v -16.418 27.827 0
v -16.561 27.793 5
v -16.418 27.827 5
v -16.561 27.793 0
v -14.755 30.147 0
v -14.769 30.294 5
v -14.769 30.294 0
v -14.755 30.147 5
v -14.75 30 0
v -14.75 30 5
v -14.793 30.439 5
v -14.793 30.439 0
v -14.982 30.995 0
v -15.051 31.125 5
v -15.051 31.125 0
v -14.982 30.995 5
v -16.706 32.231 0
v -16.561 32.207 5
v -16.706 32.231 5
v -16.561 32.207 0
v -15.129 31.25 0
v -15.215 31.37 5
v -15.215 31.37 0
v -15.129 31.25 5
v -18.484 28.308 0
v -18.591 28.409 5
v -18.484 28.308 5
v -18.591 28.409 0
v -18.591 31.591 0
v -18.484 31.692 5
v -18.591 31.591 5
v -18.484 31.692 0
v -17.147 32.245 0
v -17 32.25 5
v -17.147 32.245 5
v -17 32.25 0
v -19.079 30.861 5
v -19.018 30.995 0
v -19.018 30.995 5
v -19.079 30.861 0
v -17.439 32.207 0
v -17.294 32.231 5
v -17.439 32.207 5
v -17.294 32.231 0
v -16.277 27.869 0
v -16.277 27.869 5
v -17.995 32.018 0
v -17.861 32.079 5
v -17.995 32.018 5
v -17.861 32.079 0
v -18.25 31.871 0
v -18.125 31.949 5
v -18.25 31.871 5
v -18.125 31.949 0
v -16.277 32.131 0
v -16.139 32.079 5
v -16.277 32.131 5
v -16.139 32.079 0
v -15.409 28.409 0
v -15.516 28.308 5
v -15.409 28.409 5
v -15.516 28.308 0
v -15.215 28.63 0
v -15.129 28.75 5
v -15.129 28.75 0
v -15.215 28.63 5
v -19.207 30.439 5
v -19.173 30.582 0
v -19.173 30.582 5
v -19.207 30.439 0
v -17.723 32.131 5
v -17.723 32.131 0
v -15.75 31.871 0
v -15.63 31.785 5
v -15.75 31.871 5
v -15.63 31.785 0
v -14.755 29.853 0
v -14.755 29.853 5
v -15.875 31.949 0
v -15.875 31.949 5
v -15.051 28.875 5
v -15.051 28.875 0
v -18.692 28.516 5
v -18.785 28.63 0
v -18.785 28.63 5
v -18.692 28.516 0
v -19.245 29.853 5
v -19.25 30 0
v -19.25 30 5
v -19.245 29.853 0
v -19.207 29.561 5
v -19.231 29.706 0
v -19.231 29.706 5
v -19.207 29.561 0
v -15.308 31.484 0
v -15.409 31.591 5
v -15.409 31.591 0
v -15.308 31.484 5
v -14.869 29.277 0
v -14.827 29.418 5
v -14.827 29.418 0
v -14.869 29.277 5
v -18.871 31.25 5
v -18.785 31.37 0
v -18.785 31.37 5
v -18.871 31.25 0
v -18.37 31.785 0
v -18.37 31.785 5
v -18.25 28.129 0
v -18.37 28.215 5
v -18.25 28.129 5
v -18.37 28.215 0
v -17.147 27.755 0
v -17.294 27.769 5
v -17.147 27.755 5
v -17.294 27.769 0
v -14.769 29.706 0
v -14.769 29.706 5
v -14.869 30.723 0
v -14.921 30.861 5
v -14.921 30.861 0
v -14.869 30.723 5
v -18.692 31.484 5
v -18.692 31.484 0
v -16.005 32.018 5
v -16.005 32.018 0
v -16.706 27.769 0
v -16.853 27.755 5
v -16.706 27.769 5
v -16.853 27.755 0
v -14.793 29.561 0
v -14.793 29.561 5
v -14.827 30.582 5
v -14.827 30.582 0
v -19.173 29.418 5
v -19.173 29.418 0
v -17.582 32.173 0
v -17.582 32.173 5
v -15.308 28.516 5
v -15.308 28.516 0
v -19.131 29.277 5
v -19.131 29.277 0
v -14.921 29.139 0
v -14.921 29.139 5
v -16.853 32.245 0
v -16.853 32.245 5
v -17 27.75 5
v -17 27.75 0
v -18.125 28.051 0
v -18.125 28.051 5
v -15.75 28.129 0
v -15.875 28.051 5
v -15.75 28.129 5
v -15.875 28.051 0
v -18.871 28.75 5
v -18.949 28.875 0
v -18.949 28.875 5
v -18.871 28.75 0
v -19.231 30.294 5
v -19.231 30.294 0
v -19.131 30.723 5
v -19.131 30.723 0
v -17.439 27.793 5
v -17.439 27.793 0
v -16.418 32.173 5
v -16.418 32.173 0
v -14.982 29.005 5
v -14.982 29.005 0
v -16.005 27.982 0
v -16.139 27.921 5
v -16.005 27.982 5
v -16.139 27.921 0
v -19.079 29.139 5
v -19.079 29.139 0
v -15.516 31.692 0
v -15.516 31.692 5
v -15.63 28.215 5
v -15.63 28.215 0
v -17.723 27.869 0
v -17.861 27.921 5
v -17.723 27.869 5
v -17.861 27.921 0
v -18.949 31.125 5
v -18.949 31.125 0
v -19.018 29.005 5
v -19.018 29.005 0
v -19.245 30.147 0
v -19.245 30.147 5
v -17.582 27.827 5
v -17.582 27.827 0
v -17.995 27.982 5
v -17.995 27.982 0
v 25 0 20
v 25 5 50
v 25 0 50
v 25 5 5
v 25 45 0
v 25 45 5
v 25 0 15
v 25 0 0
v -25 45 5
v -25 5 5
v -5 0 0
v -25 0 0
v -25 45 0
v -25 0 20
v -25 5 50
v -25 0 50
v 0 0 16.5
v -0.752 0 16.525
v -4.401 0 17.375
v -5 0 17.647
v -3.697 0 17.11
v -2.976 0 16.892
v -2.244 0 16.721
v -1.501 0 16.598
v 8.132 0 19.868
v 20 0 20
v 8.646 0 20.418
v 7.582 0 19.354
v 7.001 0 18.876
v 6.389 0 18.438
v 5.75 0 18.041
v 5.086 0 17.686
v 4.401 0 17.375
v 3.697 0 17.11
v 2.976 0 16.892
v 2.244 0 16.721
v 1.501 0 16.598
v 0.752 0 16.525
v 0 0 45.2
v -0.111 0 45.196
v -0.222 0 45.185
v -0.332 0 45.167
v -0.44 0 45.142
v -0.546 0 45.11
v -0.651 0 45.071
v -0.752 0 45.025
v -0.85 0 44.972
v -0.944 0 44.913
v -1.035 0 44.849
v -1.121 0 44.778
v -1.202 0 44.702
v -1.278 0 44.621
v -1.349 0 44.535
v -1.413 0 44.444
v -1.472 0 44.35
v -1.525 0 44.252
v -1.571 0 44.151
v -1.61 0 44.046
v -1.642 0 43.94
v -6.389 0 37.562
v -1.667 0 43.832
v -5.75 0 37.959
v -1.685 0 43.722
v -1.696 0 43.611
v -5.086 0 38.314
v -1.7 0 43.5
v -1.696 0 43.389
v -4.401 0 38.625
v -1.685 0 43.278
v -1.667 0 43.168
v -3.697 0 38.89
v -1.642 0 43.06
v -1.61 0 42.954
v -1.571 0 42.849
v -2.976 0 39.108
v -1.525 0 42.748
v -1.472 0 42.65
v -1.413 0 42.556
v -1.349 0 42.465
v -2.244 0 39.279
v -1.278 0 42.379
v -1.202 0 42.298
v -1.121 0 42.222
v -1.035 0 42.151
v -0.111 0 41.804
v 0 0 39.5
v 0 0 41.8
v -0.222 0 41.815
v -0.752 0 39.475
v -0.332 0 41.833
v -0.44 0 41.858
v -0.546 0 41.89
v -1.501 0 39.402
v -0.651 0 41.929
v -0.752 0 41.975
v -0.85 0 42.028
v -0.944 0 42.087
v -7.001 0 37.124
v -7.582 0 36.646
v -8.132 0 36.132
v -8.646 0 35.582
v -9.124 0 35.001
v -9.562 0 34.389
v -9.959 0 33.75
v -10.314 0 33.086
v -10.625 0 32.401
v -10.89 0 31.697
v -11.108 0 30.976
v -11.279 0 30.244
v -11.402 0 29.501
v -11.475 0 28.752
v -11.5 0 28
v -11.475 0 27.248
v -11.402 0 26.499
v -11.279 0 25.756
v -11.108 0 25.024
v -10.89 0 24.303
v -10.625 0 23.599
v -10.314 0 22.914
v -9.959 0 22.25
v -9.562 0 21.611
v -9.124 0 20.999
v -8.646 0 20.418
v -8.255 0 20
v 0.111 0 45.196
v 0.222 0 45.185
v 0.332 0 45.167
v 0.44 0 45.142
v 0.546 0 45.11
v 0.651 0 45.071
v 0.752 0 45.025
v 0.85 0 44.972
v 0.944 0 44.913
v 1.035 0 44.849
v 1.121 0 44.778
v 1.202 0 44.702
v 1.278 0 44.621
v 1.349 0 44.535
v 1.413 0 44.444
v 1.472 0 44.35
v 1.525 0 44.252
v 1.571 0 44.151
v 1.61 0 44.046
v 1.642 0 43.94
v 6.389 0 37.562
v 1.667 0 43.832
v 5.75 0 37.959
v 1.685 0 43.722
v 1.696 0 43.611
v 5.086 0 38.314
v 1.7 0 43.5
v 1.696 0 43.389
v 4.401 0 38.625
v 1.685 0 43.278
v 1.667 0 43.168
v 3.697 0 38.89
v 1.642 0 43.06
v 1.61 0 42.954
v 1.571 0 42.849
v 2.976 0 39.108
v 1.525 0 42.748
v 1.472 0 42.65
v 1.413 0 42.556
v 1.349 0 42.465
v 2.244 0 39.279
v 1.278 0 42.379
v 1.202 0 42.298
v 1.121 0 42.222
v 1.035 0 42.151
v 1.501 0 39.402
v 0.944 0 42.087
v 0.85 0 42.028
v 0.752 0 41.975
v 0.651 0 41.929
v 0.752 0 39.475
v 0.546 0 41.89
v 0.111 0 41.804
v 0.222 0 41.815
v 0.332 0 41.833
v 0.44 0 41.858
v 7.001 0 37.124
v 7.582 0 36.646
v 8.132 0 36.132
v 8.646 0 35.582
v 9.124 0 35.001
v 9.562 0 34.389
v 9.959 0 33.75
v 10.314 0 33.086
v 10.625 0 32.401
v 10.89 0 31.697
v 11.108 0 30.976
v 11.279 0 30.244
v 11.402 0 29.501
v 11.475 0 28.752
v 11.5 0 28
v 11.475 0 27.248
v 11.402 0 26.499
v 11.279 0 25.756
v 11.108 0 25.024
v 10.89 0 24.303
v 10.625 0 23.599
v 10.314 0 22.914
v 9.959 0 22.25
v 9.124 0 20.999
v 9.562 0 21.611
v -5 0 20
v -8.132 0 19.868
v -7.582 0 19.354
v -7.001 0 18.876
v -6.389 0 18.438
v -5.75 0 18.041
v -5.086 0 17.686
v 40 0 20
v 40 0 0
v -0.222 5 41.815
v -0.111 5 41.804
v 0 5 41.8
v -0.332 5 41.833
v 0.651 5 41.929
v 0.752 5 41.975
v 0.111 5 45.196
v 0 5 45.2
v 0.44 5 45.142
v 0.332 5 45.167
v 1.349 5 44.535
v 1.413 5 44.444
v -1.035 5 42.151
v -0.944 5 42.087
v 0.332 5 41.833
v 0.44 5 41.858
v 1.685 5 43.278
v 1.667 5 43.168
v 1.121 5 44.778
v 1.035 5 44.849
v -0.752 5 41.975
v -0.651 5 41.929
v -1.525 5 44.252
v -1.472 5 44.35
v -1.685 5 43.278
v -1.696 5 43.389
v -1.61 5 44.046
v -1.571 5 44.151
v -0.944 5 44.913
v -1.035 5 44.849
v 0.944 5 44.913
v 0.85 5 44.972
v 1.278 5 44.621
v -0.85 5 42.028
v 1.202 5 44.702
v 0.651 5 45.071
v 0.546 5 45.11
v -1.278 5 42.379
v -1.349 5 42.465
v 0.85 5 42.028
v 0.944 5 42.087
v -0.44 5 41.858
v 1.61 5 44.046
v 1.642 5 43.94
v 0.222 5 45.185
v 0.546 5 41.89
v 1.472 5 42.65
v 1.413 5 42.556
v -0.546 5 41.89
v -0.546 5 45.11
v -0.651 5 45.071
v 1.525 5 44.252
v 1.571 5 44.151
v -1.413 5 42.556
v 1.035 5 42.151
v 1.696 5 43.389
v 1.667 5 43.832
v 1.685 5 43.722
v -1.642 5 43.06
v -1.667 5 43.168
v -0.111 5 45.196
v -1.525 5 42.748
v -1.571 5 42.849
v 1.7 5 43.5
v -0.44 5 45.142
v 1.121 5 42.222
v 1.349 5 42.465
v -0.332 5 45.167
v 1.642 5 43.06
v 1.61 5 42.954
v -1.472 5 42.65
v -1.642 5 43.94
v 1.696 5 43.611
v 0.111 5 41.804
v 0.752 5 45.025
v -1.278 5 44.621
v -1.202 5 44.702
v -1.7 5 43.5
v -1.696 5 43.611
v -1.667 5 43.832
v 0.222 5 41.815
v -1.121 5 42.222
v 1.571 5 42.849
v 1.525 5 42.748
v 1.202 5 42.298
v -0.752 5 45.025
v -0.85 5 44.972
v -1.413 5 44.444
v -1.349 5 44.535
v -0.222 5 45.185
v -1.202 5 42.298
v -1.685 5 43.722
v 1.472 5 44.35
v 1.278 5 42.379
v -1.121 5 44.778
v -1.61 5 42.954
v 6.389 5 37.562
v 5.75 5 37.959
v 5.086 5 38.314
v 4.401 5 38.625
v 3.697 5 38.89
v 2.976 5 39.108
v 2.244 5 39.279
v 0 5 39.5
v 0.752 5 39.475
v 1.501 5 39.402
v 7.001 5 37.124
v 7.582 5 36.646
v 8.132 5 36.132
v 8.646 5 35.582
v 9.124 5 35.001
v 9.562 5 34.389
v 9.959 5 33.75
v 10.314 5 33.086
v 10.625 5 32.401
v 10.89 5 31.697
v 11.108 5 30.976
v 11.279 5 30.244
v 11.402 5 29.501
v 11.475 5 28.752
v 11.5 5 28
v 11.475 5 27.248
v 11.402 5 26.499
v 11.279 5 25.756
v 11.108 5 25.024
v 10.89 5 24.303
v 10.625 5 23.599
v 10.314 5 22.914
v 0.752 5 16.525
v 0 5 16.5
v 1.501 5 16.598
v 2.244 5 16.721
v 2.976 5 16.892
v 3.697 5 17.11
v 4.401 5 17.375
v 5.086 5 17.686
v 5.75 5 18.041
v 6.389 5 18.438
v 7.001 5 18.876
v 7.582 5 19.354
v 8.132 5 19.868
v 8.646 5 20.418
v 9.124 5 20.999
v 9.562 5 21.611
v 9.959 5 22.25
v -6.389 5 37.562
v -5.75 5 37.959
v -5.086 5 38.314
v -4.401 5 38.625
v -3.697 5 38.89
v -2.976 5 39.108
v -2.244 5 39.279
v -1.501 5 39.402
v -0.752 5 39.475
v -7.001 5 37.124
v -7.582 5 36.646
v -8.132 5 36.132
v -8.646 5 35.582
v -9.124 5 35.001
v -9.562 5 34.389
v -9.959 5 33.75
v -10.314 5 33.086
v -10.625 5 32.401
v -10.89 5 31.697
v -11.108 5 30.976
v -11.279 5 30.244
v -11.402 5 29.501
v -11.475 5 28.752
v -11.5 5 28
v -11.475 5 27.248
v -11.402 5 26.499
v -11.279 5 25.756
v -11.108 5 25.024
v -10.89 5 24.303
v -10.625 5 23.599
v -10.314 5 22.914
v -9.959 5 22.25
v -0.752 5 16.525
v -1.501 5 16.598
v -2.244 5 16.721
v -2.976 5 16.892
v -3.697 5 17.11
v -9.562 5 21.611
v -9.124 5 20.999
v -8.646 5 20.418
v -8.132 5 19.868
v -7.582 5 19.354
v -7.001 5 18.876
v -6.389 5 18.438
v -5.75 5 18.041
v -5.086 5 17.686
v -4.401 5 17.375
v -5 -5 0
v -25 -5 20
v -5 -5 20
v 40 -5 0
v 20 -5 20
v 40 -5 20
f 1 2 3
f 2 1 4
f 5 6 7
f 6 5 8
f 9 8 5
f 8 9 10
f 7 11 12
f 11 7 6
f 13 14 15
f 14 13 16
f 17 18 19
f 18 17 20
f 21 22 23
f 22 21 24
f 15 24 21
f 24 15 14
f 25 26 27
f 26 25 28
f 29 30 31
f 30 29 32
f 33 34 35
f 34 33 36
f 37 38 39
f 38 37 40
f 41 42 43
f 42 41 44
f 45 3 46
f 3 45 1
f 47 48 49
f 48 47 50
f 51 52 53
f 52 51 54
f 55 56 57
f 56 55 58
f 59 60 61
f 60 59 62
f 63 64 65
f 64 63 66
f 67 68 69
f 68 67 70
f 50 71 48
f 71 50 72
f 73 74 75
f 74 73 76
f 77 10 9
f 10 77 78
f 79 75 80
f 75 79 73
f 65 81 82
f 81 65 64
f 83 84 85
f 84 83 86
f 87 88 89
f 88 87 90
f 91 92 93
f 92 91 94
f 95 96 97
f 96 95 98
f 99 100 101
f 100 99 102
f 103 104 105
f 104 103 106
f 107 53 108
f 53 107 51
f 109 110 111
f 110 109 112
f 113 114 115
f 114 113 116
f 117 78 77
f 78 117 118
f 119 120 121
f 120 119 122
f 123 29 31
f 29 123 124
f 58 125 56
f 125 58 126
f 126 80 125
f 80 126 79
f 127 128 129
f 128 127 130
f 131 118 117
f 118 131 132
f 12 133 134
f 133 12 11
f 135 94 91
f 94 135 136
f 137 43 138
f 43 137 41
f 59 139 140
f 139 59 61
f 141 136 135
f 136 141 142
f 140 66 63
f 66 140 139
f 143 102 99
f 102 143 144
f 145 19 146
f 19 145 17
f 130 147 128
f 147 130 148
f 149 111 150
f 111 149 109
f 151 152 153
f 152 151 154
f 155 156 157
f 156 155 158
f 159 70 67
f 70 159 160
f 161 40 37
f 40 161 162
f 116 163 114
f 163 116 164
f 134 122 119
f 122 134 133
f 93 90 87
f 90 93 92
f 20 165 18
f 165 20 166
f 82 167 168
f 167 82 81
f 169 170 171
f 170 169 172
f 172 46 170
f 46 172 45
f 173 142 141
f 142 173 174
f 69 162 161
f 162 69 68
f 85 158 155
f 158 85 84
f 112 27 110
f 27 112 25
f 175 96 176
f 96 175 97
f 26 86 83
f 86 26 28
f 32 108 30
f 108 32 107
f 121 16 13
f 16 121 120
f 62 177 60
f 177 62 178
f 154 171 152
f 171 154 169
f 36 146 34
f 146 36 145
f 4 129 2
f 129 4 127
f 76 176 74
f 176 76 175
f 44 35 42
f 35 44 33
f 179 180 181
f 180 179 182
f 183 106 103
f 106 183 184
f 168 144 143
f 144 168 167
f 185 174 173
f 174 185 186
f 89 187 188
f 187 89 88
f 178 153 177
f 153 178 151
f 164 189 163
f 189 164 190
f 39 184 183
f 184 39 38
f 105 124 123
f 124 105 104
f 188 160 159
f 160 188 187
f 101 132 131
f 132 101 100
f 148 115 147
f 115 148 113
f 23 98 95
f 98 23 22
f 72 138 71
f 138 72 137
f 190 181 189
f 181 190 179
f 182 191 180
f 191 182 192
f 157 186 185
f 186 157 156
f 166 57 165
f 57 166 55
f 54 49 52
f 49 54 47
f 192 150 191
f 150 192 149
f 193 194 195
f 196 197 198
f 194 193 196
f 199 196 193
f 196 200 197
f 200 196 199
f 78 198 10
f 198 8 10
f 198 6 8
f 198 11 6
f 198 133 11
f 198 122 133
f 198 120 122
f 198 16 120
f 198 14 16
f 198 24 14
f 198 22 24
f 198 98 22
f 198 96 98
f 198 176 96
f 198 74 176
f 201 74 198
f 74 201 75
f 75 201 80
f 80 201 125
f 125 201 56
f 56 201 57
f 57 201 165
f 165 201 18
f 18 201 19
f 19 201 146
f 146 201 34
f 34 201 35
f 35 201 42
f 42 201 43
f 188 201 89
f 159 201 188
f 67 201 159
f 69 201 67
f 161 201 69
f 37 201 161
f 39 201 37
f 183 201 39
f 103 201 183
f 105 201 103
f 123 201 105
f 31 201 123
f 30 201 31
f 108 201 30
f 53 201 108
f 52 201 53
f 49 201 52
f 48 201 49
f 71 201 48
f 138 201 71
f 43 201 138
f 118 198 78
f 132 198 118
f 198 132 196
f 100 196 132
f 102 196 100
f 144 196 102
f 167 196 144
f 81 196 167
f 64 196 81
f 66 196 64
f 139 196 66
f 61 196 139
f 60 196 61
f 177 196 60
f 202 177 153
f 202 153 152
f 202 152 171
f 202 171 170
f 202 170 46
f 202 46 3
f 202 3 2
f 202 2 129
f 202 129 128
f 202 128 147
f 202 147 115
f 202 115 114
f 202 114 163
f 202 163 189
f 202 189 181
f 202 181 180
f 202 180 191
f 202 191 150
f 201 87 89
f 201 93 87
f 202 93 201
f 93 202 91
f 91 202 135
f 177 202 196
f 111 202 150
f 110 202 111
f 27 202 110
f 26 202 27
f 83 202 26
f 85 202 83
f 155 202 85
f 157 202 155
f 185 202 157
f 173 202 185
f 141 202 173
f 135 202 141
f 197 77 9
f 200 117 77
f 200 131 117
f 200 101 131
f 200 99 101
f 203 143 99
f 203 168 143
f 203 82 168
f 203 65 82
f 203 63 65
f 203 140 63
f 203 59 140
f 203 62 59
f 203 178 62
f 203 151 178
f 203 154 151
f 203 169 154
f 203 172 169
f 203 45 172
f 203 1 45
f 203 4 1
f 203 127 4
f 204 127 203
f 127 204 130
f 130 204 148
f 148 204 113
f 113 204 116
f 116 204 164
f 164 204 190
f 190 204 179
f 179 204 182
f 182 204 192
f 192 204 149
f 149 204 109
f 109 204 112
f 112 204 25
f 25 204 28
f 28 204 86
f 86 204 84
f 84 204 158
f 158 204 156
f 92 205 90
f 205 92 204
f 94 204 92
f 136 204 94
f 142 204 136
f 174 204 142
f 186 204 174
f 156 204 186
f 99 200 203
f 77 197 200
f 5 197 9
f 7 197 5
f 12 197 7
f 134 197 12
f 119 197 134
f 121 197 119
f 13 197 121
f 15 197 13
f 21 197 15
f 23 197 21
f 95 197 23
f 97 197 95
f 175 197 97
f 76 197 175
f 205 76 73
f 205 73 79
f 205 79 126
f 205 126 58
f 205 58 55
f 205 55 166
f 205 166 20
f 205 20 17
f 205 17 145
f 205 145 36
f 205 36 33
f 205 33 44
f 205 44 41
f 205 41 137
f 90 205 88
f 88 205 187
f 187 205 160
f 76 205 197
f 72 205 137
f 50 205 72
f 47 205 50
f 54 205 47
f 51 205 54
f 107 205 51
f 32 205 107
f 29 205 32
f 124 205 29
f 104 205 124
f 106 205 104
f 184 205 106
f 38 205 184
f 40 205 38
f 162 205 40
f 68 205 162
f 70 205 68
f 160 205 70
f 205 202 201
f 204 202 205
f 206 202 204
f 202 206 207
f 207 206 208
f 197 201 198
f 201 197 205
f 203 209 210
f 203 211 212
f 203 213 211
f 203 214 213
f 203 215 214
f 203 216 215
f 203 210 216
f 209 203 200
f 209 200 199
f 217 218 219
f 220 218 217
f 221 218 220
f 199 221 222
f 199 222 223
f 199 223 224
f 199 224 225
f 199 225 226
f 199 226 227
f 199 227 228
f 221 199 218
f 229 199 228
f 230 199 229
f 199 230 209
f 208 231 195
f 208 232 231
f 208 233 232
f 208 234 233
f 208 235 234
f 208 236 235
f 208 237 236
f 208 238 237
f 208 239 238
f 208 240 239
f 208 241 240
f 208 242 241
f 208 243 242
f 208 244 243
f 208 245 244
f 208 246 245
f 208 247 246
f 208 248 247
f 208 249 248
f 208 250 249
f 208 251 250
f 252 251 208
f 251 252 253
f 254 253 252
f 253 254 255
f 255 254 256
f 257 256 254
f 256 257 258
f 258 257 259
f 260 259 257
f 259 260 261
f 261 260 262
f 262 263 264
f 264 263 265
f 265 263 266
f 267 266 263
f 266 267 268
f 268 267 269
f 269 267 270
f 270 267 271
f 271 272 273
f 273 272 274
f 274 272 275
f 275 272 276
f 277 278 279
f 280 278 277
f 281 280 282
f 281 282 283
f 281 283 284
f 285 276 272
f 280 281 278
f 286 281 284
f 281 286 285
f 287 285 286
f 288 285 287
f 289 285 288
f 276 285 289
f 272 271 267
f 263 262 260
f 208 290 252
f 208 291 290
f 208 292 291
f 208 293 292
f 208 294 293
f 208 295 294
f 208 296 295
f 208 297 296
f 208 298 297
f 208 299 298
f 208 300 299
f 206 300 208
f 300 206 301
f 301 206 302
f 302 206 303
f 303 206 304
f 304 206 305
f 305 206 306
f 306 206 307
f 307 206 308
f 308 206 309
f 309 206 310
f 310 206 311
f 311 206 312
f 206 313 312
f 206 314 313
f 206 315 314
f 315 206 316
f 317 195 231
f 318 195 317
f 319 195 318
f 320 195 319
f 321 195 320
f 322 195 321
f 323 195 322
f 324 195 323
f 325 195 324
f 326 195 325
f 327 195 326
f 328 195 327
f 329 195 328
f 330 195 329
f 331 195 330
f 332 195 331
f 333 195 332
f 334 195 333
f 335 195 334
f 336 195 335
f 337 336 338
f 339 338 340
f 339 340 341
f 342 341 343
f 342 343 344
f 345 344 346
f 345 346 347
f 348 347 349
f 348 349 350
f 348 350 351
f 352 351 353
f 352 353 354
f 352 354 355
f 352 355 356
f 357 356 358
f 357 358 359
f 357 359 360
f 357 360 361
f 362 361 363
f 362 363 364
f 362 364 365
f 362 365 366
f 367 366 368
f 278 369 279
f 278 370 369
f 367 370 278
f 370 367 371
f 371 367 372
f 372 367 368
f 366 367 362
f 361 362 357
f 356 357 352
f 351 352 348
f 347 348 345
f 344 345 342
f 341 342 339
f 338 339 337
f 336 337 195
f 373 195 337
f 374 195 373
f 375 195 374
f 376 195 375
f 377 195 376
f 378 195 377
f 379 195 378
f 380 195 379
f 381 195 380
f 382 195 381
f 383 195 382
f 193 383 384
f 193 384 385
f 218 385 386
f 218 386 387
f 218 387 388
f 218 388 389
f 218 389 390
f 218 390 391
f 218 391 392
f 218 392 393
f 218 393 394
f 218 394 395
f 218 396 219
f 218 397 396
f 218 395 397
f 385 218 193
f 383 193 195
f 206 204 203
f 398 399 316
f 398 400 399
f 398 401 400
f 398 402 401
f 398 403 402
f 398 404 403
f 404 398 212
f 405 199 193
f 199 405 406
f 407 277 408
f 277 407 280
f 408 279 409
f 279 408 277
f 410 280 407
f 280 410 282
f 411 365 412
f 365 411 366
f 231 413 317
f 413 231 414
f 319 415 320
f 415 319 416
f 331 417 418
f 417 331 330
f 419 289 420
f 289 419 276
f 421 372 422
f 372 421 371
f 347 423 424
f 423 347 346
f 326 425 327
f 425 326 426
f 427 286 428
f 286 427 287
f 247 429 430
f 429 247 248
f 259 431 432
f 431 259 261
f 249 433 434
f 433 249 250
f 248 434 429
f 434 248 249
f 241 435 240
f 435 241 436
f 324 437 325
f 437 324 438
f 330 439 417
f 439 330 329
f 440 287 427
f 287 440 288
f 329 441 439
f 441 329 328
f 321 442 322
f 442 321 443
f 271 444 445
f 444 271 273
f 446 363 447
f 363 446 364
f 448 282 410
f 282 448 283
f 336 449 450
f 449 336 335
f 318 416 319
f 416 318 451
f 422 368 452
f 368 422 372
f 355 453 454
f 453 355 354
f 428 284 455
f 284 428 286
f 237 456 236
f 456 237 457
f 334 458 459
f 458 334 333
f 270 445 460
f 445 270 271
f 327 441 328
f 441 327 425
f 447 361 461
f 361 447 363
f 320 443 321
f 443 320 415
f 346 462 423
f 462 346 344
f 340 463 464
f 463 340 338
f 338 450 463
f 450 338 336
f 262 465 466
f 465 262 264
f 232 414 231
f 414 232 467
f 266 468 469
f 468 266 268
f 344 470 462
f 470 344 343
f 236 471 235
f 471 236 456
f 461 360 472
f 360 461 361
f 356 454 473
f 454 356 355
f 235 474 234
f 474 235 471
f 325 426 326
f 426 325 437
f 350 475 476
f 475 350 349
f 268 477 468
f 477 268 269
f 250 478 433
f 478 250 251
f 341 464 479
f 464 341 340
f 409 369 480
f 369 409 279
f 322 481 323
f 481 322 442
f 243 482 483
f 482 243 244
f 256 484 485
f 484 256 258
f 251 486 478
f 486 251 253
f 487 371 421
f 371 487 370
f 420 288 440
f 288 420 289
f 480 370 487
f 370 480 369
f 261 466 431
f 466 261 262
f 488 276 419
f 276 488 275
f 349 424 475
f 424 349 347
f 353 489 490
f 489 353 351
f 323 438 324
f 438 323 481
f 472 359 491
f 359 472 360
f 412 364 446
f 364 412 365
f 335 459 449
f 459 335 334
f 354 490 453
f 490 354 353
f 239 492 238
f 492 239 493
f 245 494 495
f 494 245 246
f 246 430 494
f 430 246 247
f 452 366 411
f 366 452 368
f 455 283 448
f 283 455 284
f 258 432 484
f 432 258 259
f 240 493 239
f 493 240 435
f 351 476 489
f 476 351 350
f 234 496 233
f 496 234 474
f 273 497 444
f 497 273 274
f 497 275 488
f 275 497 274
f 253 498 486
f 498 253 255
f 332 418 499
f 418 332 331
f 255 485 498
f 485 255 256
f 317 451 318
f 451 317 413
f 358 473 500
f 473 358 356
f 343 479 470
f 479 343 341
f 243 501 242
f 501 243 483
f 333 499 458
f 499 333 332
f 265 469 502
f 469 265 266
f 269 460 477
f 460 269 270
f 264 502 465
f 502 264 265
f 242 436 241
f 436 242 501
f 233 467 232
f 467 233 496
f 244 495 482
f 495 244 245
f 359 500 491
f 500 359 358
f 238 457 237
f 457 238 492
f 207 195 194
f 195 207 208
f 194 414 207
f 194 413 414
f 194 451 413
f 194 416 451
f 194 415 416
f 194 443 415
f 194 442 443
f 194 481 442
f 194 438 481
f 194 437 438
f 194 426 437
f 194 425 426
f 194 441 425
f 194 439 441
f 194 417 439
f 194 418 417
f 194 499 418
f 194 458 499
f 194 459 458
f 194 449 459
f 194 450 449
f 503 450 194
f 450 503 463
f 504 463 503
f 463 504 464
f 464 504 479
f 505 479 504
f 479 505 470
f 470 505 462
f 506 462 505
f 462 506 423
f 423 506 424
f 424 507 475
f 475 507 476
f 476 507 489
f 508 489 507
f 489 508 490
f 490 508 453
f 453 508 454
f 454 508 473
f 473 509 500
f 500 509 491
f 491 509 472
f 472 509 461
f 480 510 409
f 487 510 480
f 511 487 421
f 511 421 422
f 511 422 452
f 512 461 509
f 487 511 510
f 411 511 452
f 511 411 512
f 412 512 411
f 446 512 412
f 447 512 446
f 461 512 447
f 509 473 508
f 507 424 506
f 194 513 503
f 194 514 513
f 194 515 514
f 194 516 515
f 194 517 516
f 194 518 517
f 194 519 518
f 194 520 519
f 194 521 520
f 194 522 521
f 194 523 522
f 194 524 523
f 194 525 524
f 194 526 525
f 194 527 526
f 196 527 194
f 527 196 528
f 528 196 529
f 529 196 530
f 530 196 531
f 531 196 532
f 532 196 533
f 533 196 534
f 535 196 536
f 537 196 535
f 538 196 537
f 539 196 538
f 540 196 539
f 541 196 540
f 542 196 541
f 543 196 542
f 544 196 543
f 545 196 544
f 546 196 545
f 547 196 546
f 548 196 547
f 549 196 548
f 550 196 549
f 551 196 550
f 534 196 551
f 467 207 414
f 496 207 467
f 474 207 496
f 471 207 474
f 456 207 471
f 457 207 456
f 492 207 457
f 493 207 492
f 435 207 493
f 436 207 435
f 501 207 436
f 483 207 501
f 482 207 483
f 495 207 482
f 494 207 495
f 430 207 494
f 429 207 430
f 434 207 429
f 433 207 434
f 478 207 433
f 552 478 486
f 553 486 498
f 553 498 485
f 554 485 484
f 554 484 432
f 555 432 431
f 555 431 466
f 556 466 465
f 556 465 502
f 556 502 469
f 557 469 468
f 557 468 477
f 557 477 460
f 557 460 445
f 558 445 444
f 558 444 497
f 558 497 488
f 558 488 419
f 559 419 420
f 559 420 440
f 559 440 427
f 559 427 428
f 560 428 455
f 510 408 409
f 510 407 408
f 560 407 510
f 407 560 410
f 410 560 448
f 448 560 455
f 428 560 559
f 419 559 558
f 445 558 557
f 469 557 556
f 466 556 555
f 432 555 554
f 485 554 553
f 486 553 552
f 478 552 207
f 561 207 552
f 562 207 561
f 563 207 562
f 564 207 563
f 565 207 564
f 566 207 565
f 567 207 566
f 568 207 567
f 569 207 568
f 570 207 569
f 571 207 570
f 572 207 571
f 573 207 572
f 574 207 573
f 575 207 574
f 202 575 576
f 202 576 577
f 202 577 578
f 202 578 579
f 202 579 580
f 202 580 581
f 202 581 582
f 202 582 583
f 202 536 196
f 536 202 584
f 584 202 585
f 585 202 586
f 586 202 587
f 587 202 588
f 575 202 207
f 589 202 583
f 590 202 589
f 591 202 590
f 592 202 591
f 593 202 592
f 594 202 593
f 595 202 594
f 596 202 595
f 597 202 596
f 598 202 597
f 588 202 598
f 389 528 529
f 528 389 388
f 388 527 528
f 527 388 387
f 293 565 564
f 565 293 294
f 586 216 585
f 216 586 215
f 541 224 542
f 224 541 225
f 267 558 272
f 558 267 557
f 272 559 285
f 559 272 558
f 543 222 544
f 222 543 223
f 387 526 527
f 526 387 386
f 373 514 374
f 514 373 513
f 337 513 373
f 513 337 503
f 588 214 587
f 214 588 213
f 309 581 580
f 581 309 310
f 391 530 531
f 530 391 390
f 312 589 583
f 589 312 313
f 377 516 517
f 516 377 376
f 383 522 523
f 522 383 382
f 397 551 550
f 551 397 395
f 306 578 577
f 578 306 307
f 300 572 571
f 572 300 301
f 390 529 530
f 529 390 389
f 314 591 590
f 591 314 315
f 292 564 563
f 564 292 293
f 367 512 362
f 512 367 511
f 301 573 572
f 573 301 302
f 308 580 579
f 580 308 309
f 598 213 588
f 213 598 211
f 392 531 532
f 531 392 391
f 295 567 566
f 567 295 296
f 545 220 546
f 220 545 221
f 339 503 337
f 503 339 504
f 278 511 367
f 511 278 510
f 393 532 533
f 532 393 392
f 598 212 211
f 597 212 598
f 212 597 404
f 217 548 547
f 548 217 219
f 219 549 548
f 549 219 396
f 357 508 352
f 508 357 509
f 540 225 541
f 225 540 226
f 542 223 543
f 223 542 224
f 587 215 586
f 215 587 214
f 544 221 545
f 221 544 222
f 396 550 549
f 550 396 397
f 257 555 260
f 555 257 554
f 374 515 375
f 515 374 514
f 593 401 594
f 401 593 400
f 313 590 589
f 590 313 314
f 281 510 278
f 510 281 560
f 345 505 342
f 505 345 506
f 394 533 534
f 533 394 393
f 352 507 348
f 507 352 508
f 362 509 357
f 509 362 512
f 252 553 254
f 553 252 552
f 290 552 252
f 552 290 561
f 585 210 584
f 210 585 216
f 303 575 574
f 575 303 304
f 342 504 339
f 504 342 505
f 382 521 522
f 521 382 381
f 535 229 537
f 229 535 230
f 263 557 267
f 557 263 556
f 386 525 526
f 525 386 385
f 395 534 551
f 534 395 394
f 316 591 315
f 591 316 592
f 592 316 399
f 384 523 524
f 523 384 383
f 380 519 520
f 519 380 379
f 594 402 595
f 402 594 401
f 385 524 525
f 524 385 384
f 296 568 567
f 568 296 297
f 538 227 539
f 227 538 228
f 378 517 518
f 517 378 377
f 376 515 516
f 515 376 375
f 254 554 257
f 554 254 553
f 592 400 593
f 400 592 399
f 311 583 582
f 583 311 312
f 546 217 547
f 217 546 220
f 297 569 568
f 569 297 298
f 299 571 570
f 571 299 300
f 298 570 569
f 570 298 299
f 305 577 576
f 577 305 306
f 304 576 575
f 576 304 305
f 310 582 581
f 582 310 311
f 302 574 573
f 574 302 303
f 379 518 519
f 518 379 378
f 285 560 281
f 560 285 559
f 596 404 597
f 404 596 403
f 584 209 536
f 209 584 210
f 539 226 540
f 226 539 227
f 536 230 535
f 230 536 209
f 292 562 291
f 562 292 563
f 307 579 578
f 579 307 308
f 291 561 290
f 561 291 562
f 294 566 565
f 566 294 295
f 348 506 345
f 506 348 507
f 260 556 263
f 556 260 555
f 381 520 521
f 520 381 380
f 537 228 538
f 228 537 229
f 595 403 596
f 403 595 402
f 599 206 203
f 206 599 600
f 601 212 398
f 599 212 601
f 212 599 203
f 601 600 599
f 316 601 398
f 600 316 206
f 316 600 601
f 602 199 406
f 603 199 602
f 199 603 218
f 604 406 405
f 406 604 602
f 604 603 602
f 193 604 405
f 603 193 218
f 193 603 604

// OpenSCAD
// L-shaped mounting bracket for NEMA 17 stepper motor
// Print orientation: base plate flat on the bed, motor plate vertical.

// ---------------- Parameters ----------------
plate_x       = 25;    // base plate half-width (X)
plate_y       = 45;    // base plate length (Y)
plate_t       = 5;     // base plate thickness (Z)

motor_h       = 50;    // motor plate height (Z)
motor_w       = 5;     // motor plate thickness (Y)

boss_d        = 23;    // motor boss hole diameter
boss_x        = 0;     // boss hole centre X
boss_z        = 28;    // boss hole centre Z

screw_d       = 3.4;   // M3 screw hole diameter
screw_pitch   = 31;    // square pitch for screw holes
screw_count   = 4;     // number of screw holes

gusset_t      = 5;     // gusset thickness (X)
gusset_leg    = 20;    // gusset right-triangle leg length (Y and Z)

eps           = 0.5;   // cutter overshoot past faces
$fn           = 96;    // curve resolution

// ---------------- Model ----------------
union() {
    // Base plate with M4 through-holes
    difference() {
        translate([-plate_x, 0, 0])
            cube([plate_x * 2, plate_y, plate_t]);
        for (h = [0, 1])
            translate([-17, 30, h * plate_t - eps])
                cylinder(d = 4.5, h = plate_t + 2 * eps);
    }

    // Vertical motor plate with boss hole and M3 screw holes
    difference() {
        translate([-plate_x, 0, 0])
            cube([plate_x * 2, motor_w, motor_h]);
        translate([boss_x, -eps, boss_z])
            rotate([-90, 0, 0])
                cylinder(d = boss_d, h = motor_w + 2 * eps);
        for (i = [0 : screw_count - 1]) {
            a = atan2(sin(i * 90), cos(i * 90));
            translate([boss_x, motor_w / 2 - screw_pitch / 2,
                       boss_z + screw_pitch / 2])
                rotate([0, 90, a])
                    cylinder(d = screw_d, h = screw_pitch + 2 * eps);
        }
    }

    // Triangular gussets flush with left and right edges
    for (gx = [-25, 20])
        translate([gx, 0, 0])
            rotate([90, 0, 0])
                linear_extrude(height = gusset_t)
                    polygon(points = [
                        [gusset_leg, gusset_leg],
                        [gusset_leg, 0],
                        [0, gusset_leg]
                    ]);
}
